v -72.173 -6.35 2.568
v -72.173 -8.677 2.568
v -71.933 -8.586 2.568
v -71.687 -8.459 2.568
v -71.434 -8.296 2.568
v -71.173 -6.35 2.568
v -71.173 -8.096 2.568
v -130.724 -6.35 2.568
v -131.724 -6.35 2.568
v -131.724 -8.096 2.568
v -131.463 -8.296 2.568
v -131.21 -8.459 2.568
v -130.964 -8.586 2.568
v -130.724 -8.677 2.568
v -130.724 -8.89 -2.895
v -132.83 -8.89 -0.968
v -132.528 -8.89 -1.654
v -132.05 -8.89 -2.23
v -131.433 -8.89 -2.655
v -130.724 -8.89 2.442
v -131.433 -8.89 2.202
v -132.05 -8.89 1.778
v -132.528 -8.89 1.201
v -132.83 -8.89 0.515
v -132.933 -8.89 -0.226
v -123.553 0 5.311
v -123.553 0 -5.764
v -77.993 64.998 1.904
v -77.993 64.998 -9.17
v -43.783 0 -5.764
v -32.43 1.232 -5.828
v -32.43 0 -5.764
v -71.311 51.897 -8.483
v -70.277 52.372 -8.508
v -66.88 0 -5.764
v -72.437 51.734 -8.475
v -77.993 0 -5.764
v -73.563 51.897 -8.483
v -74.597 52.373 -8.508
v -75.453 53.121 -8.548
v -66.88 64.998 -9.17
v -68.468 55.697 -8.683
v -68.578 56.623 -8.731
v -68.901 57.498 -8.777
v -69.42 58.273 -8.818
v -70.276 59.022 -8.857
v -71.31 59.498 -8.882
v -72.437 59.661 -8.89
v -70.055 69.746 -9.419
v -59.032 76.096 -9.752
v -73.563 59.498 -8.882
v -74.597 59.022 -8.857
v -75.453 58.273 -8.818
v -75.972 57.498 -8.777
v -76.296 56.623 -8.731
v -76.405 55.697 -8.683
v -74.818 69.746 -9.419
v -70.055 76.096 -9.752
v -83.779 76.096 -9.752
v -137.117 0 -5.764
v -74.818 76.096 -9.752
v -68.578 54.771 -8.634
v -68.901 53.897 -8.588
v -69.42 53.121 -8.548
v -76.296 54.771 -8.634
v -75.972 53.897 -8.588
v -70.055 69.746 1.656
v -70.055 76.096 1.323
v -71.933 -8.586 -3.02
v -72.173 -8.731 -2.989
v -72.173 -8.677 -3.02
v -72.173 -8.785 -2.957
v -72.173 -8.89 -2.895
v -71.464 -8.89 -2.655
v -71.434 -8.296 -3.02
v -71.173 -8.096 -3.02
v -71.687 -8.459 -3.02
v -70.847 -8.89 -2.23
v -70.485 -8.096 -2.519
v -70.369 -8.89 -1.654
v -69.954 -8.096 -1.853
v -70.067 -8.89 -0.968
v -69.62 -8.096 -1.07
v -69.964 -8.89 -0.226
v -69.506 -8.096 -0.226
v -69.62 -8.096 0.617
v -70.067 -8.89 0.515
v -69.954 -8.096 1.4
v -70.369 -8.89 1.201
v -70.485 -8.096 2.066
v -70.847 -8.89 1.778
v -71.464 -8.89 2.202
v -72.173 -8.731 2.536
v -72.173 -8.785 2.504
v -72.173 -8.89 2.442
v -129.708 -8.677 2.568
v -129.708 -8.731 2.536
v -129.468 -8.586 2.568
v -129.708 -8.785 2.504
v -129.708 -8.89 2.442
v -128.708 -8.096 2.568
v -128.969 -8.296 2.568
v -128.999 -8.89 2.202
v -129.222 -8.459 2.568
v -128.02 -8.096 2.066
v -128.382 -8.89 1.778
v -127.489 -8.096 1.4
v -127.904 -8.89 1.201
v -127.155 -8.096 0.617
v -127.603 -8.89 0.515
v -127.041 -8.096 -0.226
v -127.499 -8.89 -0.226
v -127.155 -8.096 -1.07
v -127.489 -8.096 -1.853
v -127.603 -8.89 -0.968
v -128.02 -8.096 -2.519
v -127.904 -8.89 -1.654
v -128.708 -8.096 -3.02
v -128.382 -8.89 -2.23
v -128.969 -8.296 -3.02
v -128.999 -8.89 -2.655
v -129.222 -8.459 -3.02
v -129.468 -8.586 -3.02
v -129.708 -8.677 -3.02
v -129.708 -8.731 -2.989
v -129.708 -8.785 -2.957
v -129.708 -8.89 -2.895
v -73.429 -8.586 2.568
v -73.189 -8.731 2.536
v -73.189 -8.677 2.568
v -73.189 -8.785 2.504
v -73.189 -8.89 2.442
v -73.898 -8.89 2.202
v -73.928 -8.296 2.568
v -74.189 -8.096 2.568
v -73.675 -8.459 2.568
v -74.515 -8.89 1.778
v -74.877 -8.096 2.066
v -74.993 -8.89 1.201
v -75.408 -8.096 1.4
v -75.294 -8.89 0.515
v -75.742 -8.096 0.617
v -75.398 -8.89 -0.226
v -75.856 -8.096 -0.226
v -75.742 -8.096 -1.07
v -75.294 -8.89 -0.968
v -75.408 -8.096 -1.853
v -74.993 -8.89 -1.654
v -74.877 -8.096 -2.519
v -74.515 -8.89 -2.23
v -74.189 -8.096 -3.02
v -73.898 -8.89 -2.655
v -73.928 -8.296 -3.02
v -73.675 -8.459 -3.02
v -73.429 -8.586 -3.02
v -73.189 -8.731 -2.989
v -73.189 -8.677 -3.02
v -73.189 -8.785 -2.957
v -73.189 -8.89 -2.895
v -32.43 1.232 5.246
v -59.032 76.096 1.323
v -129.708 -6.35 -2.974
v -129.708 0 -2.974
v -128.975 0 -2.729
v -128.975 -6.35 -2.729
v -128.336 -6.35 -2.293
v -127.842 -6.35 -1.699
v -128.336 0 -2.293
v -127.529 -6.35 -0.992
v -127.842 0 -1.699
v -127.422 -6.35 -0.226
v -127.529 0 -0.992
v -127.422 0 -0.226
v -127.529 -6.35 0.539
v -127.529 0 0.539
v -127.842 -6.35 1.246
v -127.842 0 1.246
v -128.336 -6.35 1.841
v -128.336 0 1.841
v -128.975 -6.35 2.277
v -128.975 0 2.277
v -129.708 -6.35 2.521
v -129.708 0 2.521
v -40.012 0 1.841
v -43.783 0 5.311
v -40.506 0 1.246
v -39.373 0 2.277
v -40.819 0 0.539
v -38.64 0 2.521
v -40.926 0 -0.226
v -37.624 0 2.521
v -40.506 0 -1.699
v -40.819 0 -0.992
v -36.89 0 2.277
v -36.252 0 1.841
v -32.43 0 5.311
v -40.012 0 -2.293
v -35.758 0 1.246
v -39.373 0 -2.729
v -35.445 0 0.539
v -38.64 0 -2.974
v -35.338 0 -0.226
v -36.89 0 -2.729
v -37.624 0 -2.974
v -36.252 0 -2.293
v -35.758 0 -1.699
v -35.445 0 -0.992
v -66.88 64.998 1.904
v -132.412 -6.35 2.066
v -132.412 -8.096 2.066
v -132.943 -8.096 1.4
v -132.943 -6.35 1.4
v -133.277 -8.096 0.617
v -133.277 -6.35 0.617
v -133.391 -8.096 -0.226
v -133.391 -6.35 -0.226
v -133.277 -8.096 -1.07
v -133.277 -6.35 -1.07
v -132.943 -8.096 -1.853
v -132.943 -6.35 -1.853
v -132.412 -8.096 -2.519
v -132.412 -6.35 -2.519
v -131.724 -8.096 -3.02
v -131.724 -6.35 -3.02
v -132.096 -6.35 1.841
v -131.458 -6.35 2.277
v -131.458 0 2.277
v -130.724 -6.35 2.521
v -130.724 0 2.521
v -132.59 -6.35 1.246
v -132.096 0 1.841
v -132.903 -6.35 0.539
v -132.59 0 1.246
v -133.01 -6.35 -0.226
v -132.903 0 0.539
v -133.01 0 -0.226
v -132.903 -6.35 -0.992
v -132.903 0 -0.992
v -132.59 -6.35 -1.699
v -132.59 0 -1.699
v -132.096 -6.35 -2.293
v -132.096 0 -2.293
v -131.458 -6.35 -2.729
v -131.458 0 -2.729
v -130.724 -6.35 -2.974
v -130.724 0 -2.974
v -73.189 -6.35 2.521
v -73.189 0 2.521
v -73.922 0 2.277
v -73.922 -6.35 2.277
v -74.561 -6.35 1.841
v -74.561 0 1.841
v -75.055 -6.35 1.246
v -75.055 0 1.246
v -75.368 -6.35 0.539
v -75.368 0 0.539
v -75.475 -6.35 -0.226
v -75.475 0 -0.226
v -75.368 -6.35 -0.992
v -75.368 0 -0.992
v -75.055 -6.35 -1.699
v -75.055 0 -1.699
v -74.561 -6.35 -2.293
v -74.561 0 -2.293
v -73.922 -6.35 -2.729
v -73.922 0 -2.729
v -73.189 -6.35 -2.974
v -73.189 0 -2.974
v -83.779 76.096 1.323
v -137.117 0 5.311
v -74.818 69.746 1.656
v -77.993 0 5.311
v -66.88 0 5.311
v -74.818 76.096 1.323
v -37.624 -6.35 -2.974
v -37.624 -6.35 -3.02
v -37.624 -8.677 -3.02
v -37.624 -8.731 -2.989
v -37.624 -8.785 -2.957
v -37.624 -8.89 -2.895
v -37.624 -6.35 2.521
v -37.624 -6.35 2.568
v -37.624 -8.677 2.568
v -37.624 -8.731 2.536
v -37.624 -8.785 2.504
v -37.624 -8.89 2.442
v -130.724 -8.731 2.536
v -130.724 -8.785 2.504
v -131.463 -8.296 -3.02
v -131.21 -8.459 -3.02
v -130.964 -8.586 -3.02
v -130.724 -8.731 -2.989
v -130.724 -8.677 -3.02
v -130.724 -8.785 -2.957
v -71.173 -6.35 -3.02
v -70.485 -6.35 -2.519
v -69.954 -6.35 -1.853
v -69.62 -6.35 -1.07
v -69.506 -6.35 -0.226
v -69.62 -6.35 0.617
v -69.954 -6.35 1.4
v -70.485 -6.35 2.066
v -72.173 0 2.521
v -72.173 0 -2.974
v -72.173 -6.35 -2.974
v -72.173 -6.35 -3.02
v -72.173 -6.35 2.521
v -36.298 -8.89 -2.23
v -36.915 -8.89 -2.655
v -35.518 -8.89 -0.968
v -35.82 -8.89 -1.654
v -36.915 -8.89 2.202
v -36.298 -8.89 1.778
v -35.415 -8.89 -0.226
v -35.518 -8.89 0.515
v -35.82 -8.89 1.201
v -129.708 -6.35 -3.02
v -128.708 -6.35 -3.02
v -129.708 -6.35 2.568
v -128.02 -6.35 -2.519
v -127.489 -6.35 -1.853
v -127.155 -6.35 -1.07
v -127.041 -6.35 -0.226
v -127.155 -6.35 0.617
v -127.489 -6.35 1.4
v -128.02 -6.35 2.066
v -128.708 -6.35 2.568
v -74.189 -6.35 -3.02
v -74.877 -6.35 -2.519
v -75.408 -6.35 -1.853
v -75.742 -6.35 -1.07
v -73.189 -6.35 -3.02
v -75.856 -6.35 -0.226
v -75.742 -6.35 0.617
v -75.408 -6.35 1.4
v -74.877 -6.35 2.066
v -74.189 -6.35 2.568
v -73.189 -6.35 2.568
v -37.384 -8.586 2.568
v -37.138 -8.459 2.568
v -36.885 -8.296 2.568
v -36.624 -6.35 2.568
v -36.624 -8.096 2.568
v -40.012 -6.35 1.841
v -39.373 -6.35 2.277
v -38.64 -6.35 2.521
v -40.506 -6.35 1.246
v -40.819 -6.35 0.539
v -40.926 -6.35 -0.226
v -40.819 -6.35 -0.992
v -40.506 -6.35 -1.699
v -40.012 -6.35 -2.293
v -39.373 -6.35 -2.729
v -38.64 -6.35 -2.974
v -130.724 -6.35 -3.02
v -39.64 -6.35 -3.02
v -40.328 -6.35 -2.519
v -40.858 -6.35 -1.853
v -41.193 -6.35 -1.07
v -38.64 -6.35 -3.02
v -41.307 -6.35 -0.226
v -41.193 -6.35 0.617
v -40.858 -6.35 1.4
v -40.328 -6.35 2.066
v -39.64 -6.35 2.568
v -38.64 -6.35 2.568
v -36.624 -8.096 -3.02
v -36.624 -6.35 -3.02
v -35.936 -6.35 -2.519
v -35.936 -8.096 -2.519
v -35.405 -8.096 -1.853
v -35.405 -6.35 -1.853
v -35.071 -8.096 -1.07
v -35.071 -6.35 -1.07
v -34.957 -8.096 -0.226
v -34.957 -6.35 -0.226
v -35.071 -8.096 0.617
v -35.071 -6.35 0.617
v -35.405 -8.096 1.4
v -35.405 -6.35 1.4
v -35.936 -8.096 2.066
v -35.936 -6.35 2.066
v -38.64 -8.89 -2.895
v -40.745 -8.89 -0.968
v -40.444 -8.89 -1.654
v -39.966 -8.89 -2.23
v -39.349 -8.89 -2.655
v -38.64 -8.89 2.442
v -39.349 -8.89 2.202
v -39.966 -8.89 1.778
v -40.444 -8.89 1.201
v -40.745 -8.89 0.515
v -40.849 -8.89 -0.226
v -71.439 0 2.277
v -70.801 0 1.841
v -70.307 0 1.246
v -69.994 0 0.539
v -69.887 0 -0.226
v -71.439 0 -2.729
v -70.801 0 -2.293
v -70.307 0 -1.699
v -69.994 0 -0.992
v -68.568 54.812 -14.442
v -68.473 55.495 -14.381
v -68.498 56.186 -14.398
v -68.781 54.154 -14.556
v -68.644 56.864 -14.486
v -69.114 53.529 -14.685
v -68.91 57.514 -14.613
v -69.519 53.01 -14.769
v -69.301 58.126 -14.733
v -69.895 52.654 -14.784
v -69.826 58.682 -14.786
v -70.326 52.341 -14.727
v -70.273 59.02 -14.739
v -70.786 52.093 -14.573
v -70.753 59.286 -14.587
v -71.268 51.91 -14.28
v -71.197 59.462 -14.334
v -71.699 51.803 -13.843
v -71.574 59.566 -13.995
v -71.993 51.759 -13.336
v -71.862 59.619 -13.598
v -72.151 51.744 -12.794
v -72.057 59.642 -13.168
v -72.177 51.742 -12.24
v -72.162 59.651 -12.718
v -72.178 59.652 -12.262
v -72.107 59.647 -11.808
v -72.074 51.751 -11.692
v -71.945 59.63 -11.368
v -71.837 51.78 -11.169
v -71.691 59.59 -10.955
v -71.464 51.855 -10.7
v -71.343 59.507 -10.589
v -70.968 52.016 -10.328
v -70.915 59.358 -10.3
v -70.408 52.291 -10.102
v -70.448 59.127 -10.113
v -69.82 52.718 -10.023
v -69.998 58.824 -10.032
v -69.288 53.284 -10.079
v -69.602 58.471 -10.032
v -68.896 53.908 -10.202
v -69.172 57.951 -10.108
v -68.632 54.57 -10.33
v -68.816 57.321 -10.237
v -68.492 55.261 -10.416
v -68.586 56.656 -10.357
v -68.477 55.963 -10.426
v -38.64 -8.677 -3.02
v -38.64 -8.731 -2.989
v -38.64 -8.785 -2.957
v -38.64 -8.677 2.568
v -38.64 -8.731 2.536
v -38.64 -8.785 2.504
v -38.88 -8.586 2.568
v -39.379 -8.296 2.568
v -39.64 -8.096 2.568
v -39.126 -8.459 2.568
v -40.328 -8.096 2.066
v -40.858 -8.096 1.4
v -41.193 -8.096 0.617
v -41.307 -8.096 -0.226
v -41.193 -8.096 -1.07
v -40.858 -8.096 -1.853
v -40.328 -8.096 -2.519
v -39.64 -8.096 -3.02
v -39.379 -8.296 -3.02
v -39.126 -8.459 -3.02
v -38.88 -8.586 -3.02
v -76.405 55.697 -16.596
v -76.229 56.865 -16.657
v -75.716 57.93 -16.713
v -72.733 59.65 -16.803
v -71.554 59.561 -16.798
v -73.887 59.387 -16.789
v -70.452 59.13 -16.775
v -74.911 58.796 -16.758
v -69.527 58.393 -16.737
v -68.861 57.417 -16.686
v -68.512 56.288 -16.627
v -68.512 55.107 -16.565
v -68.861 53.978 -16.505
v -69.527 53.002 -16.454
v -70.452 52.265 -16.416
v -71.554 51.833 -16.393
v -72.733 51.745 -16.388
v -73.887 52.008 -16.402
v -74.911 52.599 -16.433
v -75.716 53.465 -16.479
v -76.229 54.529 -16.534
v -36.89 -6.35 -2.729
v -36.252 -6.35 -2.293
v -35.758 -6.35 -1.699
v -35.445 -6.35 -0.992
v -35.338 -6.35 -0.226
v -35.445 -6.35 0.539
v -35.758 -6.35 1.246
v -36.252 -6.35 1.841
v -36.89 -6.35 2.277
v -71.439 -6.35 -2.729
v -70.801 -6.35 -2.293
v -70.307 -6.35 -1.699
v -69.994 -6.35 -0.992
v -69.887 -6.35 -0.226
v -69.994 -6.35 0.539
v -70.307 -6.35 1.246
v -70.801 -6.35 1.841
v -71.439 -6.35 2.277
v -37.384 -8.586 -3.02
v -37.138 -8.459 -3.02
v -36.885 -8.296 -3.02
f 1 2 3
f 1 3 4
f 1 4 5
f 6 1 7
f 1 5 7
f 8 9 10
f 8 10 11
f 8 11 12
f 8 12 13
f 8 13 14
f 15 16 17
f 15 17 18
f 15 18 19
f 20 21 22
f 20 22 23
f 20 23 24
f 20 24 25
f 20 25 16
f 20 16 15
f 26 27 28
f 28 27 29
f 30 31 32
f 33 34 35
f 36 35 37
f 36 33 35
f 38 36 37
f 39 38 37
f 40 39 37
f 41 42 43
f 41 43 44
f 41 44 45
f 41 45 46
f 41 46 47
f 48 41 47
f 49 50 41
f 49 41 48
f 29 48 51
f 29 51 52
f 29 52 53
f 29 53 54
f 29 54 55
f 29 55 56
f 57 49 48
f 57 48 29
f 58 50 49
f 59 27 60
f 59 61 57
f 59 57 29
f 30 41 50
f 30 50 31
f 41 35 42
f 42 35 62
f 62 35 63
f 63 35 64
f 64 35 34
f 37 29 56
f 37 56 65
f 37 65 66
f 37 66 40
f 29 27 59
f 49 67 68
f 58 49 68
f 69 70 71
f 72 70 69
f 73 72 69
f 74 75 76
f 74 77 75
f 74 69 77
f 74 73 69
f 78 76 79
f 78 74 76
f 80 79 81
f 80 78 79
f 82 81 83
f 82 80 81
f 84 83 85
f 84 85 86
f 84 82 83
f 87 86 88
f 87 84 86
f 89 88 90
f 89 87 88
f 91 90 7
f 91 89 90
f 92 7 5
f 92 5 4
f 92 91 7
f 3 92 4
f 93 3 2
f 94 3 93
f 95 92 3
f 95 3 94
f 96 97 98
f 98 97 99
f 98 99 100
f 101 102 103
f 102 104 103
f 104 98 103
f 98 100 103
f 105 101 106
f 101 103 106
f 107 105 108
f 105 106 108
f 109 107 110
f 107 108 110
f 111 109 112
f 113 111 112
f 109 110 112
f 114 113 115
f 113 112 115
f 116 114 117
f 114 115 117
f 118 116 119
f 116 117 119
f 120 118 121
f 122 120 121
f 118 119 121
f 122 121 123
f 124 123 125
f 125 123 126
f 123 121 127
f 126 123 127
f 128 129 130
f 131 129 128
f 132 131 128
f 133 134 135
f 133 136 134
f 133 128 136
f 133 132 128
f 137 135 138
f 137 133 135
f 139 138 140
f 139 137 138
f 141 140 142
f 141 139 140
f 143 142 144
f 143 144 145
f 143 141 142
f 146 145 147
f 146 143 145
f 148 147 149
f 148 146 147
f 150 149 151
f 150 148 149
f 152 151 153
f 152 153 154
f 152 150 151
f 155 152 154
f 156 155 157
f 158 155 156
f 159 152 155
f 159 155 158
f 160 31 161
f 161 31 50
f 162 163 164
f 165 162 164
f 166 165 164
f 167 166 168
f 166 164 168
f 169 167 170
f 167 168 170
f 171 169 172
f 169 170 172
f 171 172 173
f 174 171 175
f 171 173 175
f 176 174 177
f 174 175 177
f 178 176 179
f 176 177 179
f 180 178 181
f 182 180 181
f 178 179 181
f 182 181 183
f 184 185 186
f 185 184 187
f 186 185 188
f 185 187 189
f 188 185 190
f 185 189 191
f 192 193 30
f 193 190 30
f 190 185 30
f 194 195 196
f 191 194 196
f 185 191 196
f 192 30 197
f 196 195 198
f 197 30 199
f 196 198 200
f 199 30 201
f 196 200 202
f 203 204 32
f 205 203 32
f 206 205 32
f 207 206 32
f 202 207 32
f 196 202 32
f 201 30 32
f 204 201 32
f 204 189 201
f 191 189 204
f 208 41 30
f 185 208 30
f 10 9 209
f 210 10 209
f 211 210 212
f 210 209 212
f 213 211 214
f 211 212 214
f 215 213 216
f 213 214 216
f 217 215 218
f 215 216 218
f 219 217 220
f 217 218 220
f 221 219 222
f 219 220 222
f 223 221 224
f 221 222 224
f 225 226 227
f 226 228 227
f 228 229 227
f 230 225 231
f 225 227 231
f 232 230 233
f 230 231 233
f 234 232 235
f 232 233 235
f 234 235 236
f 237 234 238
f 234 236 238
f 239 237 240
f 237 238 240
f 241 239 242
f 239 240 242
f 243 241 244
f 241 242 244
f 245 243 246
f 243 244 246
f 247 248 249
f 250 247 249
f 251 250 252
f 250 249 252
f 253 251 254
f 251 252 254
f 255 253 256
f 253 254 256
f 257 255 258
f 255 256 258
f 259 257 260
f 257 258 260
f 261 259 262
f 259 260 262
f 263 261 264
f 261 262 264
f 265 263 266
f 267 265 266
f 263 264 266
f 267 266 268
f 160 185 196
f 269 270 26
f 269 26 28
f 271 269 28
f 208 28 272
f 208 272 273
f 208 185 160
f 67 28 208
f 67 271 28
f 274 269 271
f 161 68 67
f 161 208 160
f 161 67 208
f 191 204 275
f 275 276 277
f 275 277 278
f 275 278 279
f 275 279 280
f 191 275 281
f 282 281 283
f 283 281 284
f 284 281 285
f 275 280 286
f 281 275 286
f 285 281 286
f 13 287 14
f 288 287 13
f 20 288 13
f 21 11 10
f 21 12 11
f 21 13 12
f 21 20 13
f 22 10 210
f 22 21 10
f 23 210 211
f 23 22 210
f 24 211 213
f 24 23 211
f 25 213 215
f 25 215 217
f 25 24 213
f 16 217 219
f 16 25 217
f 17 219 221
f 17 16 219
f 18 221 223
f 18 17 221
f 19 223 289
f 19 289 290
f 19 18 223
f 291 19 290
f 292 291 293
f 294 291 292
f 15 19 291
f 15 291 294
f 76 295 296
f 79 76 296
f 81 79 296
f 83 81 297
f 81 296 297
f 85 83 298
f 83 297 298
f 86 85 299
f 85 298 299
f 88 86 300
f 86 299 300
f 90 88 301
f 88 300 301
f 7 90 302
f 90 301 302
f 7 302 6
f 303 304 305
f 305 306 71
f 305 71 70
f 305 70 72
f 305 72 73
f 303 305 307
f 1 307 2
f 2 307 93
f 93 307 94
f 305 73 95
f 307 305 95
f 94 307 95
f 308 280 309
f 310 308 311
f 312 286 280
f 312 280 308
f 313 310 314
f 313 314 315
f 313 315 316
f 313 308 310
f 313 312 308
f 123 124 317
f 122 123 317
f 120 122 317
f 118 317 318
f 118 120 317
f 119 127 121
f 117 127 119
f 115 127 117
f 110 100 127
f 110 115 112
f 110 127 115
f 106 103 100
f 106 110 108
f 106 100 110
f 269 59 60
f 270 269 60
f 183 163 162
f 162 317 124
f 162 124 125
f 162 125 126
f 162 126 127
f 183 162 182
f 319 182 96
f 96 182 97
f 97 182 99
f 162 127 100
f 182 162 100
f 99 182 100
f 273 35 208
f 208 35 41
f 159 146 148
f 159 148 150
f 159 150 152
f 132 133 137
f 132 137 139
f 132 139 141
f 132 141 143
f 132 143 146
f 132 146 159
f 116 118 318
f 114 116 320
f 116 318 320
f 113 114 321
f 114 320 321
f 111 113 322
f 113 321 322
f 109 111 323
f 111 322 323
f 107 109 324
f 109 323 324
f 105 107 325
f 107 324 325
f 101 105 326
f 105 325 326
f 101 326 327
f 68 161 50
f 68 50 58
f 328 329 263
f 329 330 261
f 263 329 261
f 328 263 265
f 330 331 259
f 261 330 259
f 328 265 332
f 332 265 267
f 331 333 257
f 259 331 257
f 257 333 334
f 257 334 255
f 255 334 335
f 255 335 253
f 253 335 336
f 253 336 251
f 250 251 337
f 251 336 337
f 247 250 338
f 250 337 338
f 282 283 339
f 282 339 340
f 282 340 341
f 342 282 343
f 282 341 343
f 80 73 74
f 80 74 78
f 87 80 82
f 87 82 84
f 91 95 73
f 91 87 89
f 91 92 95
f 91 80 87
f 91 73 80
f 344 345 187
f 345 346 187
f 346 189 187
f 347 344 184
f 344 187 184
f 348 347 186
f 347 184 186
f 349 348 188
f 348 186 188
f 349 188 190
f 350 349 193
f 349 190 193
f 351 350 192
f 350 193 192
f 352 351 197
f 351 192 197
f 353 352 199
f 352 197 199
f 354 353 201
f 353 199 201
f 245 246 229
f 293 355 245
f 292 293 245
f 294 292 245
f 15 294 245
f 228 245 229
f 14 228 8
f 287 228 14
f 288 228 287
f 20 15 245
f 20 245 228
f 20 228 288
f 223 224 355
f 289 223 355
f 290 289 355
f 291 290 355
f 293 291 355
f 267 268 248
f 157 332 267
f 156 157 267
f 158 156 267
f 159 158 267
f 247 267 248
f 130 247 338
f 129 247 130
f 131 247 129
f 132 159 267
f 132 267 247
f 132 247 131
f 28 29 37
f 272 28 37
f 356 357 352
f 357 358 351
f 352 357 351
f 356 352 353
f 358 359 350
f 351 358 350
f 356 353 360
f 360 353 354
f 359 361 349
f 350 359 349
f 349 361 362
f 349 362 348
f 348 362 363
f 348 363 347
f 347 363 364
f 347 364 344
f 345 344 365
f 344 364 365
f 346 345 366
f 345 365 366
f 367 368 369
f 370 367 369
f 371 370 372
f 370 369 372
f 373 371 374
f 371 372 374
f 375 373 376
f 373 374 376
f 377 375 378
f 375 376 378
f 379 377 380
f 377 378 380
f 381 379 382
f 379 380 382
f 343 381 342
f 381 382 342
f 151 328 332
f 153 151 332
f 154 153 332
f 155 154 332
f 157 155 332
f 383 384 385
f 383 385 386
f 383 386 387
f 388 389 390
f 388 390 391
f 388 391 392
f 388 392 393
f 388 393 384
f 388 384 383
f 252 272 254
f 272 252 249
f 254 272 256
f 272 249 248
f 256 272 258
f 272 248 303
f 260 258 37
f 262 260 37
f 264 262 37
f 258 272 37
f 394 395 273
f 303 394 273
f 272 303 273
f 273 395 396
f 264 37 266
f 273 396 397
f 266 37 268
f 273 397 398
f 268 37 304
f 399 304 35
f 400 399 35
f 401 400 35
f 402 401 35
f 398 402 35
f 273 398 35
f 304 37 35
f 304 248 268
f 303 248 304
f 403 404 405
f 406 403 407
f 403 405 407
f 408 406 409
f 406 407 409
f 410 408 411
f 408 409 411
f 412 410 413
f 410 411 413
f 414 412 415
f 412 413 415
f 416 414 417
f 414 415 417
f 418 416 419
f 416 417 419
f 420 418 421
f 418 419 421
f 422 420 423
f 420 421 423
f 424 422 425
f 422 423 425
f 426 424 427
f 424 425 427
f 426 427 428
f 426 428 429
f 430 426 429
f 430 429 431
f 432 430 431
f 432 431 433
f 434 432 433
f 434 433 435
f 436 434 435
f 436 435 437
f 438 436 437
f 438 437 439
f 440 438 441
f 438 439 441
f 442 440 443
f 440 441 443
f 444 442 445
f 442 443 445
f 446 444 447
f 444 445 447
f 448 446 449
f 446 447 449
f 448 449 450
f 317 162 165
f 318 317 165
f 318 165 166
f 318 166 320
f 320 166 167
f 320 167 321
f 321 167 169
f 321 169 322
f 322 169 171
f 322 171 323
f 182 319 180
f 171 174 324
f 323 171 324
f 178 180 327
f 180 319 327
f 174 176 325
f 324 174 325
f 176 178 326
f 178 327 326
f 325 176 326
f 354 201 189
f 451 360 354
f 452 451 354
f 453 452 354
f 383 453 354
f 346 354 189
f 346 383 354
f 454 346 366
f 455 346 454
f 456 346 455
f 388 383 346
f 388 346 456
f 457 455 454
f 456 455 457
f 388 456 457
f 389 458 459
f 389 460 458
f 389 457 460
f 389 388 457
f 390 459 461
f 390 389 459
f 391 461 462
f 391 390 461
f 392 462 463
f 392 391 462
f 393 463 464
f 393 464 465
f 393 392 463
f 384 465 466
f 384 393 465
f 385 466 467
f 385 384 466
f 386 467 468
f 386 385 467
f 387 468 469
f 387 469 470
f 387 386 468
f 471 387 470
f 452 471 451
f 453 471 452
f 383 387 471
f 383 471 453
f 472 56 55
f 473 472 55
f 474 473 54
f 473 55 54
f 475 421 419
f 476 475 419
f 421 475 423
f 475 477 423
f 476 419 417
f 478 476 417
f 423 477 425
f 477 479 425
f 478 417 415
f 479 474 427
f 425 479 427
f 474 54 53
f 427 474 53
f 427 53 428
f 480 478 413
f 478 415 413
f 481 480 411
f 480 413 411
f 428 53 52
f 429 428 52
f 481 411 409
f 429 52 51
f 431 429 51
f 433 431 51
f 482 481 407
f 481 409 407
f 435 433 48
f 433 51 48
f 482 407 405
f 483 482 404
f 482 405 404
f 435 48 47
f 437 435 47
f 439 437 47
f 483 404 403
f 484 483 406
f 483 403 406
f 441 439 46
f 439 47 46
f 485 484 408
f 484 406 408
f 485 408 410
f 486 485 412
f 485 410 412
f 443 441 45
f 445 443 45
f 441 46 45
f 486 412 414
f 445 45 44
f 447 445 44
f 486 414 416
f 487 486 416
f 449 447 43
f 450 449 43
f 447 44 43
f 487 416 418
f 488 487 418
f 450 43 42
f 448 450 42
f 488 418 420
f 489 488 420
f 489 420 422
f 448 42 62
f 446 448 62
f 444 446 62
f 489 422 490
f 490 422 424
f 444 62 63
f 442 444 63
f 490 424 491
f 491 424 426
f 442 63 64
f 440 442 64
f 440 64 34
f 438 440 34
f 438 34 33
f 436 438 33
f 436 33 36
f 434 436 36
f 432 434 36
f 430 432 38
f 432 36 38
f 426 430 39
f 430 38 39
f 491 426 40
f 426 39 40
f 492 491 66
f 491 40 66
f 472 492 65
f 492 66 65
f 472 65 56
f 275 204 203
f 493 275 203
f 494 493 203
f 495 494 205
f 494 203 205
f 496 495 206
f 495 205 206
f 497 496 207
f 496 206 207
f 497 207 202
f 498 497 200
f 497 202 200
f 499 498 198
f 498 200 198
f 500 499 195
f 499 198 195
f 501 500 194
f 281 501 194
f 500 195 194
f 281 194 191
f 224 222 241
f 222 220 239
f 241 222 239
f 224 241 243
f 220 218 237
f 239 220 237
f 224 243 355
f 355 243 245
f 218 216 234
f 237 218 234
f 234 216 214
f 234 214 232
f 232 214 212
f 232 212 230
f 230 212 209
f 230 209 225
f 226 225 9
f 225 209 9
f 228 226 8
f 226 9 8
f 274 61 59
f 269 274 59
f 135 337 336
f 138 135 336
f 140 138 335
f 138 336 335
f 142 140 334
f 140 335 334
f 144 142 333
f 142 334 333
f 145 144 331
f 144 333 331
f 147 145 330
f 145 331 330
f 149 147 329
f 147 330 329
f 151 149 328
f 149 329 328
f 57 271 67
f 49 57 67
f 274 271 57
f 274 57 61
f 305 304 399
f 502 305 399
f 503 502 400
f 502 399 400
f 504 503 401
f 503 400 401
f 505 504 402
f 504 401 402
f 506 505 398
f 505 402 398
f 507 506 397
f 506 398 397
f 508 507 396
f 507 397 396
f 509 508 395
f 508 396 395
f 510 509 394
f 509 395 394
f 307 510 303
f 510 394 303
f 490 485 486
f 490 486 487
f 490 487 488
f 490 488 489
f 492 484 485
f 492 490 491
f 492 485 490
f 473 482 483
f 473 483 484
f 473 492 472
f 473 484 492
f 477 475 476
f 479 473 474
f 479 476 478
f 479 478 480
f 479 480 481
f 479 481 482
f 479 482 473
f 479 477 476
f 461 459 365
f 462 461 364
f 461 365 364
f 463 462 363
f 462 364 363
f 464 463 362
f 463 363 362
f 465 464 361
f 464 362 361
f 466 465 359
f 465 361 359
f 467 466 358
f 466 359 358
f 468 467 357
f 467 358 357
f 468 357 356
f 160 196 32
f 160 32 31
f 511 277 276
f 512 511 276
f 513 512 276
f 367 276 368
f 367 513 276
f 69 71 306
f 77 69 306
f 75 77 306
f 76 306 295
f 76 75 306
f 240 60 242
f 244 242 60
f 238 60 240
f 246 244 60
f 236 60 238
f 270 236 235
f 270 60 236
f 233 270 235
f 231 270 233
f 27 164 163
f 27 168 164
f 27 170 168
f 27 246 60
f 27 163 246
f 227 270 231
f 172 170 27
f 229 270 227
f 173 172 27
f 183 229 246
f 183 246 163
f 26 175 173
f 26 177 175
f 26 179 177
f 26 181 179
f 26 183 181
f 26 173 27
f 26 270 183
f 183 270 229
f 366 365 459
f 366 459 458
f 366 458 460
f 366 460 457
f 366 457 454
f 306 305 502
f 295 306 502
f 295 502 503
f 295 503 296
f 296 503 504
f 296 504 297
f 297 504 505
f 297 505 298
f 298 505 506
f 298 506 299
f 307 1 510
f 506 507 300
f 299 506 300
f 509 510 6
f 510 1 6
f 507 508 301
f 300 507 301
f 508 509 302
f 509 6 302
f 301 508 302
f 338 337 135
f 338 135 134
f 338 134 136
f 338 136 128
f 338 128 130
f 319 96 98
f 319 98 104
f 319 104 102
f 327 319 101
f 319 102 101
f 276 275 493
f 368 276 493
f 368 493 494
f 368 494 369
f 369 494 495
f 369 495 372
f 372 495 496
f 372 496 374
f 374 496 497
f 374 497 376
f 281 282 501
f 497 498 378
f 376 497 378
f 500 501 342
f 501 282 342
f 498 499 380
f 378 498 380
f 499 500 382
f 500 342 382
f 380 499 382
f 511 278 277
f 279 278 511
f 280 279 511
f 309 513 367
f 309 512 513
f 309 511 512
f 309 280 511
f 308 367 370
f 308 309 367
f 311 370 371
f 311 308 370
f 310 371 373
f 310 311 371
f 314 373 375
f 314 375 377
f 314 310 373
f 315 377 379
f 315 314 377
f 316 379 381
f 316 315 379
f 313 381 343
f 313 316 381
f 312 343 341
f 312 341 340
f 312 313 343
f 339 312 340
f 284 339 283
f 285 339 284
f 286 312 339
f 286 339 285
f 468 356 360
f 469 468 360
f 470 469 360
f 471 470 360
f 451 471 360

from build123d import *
from OCP.BRepFilletAPI import BRepFilletAPI_MakeChamfer

# Parameters (mm, degrees)
BOSS_EXTRUDE2_DEPTH     = 11.0744
CUT_EXTRUDE1_DEPTH      = 158.120213562
CUT_EXTRUDE1_DEPTH_BACK = 158.120213562
SKETCH3_W               = 4.7625
SKETCH3_H               = 6.35
CUT_EXTRUDE6_DEPTH      = 158.120213562
CUT_EXTRUDE6_DEPTH_BACK = 158.120213562
SKETCH12_W              = 1.27
SKETCH12_H              = 1.27
SKETCH12_W_2            = 12.7
SKETCH12_H_2            = 12.7
SKETCH13_R              = 2.794
BOSS_EXTRUDE3_DEPTH     = 6.35
SKETCH14_R              = 3.175
BOSS_EXTRUDE4_DEPTH     = 2.54
CUT_EXTRUDE7_REACH      = 163.613
SKETCH15_W              = 1.016
SKETCH15_H              = 6.35
SKETCH15_W_2            = 3.01608289
SKETCH15_H_2            = 0.381
SKETCH17_R              = 3.96875
BOSS_EXTRUDE5_DEPTH     = 16.44396
SKETCH18_R              = 2.38125
CUT_EXTRUDE9_DEPTH      = 5.334
CHAMFER1_SIZE           = 0.79375
CHAMFER1_SIZE2          = 0.458271776
SKETCH19_W              = 6.0325
SKETCH19_H              = 64.754314085
BOSS_EXTRUDE11_DEPTH    = 8.542621607


with BuildPart() as part:
    # Sketch2 → Boss-Extrude2 (new, along a direction that is not the sketch's normal)
    with BuildSketch(Plane(origin=(0, -0.301230094, -5.747812595), x_dir=(1, 0, 0), z_dir=(0, 0.05233595624294042, 0.998629534754574))):
        Polygon((-31.991936044, 0.301643486), (-59.03245329, 76.501643486), (-83.778875482, 76.501643486), (-137.117219796, 0.301643486), (-123.552823331, 0.301643486), (-77.992987563, 65.389143486), (-77.992987563, 0.301643486), (-66.880487563, 0.301643486), (-66.880487563, 65.389143486), (-43.783379083, 0.301643486), align=None)
    extrude(amount=BOSS_EXTRUDE2_DEPTH, dir=(0, 0, 1))

    # Sketch3 → Cut-Extrude1 (cut, two sides: drawn at the far end of the back side and taken through both)
    with BuildSketch(Plane.XY.offset(-CUT_EXTRUDE1_DEPTH_BACK)):
        with Locations((-72.436737563, 72.920570548)):
            Rectangle(SKETCH3_W, SKETCH3_H)
    extrude(amount=CUT_EXTRUDE1_DEPTH + CUT_EXTRUDE1_DEPTH_BACK, mode=Mode.SUBTRACT)

    # Sketch12 → Cut-Extrude6 (cut, two sides: drawn at the far end of the back side and taken through both)
    with BuildSketch(Plane.XY.offset(-CUT_EXTRUDE6_DEPTH_BACK)):
        with Locations((-31.794579083, 0.635)):
            Rectangle(SKETCH12_W, SKETCH12_H)
        with Locations((-144.340183331, 6.35)):
            Rectangle(SKETCH12_W_2, SKETCH12_H_2)
    extrude(amount=CUT_EXTRUDE6_DEPTH + CUT_EXTRUDE6_DEPTH_BACK, mode=Mode.SUBTRACT)

    # Shell13: read off the stored shape, not the designer's step
    # Shell13: loft between two sections, ruled curve by curve
    shell13_from = [
        Edge.make_line((-67.225707879, 73.555570548, -9.618483502), (-41.990365712, 2.54, -5.896715155)),
        Edge.make_line((-35.590124494, 2.54, -5.896715155), (-60.82546666, 73.555570548, -9.618483502)),
        Edge.make_line((-41.990365712, 2.54, -5.896715155), (-35.590124494, 2.54, -5.896715155)),
        Edge.make_line((-60.82546666, 73.555570548, -9.618483502), (-67.225707879, 73.555570548, -9.618483502)),
    ]
    shell13_to = [
        Edge.make_line((-67.225707879, 73.555570548, -1.087569261), (-41.990365712, 2.54, 2.634199086)),
        Edge.make_line((-35.590124494, 2.54, 2.634199086), (-60.82546666, 73.555570548, -1.087569261)),
        Edge.make_line((-41.990365712, 2.54, 2.634199086), (-35.590124494, 2.54, 2.634199086)),
        Edge.make_line((-60.82546666, 73.555570548, -1.087569261), (-67.225707879, 73.555570548, -1.087569261)),
    ]
    shell13 = Solid(Shell([*[Face.make_surface_from_curves(shell13_from[k], shell13_to[k]) for k in range(4)], Face(Wire(shell13_from)), Face(Wire(shell13_to))]))
    add(shell13, mode=Mode.SUBTRACT)

    # Shell13 2: loft between two sections, ruled curve by curve
    shell13_2_from = [
        Edge.make_line((-75.452987563, 2.54, -5.896715155), (-69.420487563, 2.54, -5.896715155)),
        Edge.make_line((-75.452987563, 67.205570548, -9.285694103), (-69.420487563, 67.205570548, -9.285694103)),
        Edge.make_line((-69.420487563, 2.54, -5.896715155), (-69.420487563, 67.205570548, -9.285694103)),
        Edge.make_line((-75.452987563, 67.205570548, -9.285694103), (-75.452987563, 2.54, -5.896715155)),
    ]
    shell13_2_to = [
        Edge.make_line((-75.452987563, 2.54, 2.634199086), (-69.420487563, 2.54, 2.634199086)),
        Edge.make_line((-75.452987563, 67.205570548, -0.754779862), (-69.420487563, 67.205570548, -0.754779862)),
        Edge.make_line((-69.420487563, 2.54, 2.634199086), (-69.420487563, 67.205570548, -0.754779862)),
        Edge.make_line((-75.452987563, 67.205570548, -0.754779862), (-75.452987563, 2.54, 2.634199086)),
    ]
    shell13_2 = Solid(Shell([*[Face.make_surface_from_curves(shell13_2_from[k], shell13_2_to[k]) for k in range(4)], Face(Wire(shell13_2_from)), Face(Wire(shell13_2_to))]))
    add(shell13_2, mode=Mode.SUBTRACT)

    # Shell13 3: loft between two sections, ruled curve by curve
    shell13_3_from = [
        Edge.make_line((-132.235001715, 2.54, -5.896715155), (-124.87427188, 2.54, -5.896715155)),
        Edge.make_line((-82.457426933, 73.555570548, -9.618483502), (-77.357987563, 73.555570548, -9.618483502)),
        Edge.make_line((-82.457426933, 73.555570548, -9.618483502), (-132.235001715, 2.54, -5.896715155)),
        Edge.make_line((-124.87427188, 2.54, -5.896715155), (-77.357987563, 70.329482632, -9.449411398)),
        Edge.make_line((-77.357987563, 70.329482632, -9.449411398), (-77.357987563, 73.555570548, -9.618483502)),
    ]
    shell13_3_to = [
        Edge.make_line((-132.235001715, 2.54, 2.634199086), (-124.87427188, 2.54, 2.634199086)),
        Edge.make_line((-82.457426933, 73.555570548, -1.087569261), (-77.357987563, 73.555570548, -1.087569261)),
        Edge.make_line((-82.457426933, 73.555570548, -1.087569261), (-132.235001715, 2.54, 2.634199086)),
        Edge.make_line((-124.87427188, 2.54, 2.634199086), (-77.357987563, 70.329482632, -0.918497157)),
        Edge.make_line((-77.357987563, 70.329482632, -0.918497157), (-77.357987563, 73.555570548, -1.087569261)),
    ]
    shell13_3 = Solid(Shell([*[Face.make_surface_from_curves(shell13_3_from[k], shell13_3_to[k]) for k in range(5)], Face(Wire(shell13_3_from)), Face(Wire(shell13_3_to))]))
    add(shell13_3, mode=Mode.SUBTRACT)

    # Sketch13 → Boss-Extrude3 (add)
    with BuildSketch(Plane.XZ):
        with Locations(Location((-130.216039796, -0.226399396, 0), (0, 0, 180))):
            Circle(SKETCH13_R)
        with Locations(Location((-72.680959083, -0.226399396, 0), (0, 0, 90))):
            Circle(SKETCH13_R)
        with Locations(Location((-38.131879083, -0.226399396, 0), (0, 0, 180))):
            Circle(SKETCH13_R)
    extrude(amount=BOSS_EXTRUDE3_DEPTH)

    # Sketch14 → Boss-Extrude4 (add)
    with BuildSketch(Plane.XZ.offset(6.35)):
        with Locations((-130.216039796, -0.226399396)):
            Circle(SKETCH14_R)
        with Locations((-72.680959083, -0.226399396)):
            Circle(SKETCH14_R)
        with Locations((-38.131879083, -0.226399396)):
            Circle(SKETCH14_R)
    extrude(amount=BOSS_EXTRUDE4_DEPTH)

    # Cut-Extrude7: up to this face of the body (flat: up to its plane)
    cut_extrude7_end = Plane(part.part.faces().sort_by_distance((-136.942109777, 0, -0.226399396))[0])
    # Sketch15 → Cut-Extrude7 (cut, up to the picked face)
    with BuildSketch(Plane.XZ.offset(8.89), mode=Mode.PRIVATE) as cut_extrude7_sk1:
        with Locations((-130.216039796, -0.226399396)):
            Rectangle(SKETCH15_W, SKETCH15_H)
    cut_extrude7_tool1 = split(extrude(cut_extrude7_sk1.sketch, amount=-CUT_EXTRUDE7_REACH, mode=Mode.PRIVATE), bisect_by=cut_extrude7_end, keep=Keep.BOTH, mode=Mode.PRIVATE)
    # Sketch15 → Cut-Extrude7 (cut, up to the picked face)
    with BuildSketch(Plane.XZ.offset(8.89), mode=Mode.PRIVATE) as cut_extrude7_sk2:
        with Locations((-72.680959083, -0.226399396)):
            Rectangle(SKETCH15_W, SKETCH15_H)
    cut_extrude7_tool2 = split(extrude(cut_extrude7_sk2.sketch, amount=-CUT_EXTRUDE7_REACH, mode=Mode.PRIVATE), bisect_by=cut_extrude7_end, keep=Keep.BOTH, mode=Mode.PRIVATE)
    # Sketch15 → Cut-Extrude7 (cut, up to the picked face)
    with BuildSketch(Plane.XZ.offset(8.89), mode=Mode.PRIVATE) as cut_extrude7_sk3:
        with Locations((-38.131879083, -0.226399396)):
            Rectangle(SKETCH15_W, SKETCH15_H)
    cut_extrude7_tool3 = split(extrude(cut_extrude7_sk3.sketch, amount=-CUT_EXTRUDE7_REACH, mode=Mode.PRIVATE), bisect_by=cut_extrude7_end, keep=Keep.BOTH, mode=Mode.PRIVATE)
    # Sketch15 → Cut-Extrude7 (cut, up to the picked face)
    with BuildSketch(Plane.XZ.offset(8.89), mode=Mode.PRIVATE) as cut_extrude7_sk4:
        with Locations((-130.216039796, 2.758100604)):
            Rectangle(SKETCH15_W_2, SKETCH15_H_2)
    cut_extrude7_tool4 = split(extrude(cut_extrude7_sk4.sketch, amount=-CUT_EXTRUDE7_REACH, mode=Mode.PRIVATE), bisect_by=cut_extrude7_end, keep=Keep.BOTH, mode=Mode.PRIVATE)
    # Sketch15 → Cut-Extrude7 (cut, up to the picked face)
    with BuildSketch(Plane.XZ.offset(8.89), mode=Mode.PRIVATE) as cut_extrude7_sk5:
        with Locations((-130.216039796, -3.210899396)):
            Rectangle(SKETCH15_W_2, SKETCH15_H_2)
    cut_extrude7_tool5 = split(extrude(cut_extrude7_sk5.sketch, amount=-CUT_EXTRUDE7_REACH, mode=Mode.PRIVATE), bisect_by=cut_extrude7_end, keep=Keep.BOTH, mode=Mode.PRIVATE)
    # Sketch15 → Cut-Extrude7 (cut, up to the picked face)
    with BuildSketch(Plane.XZ.offset(8.89), mode=Mode.PRIVATE) as cut_extrude7_sk6:
        with Locations((-72.680959083, 2.758100604)):
            Rectangle(SKETCH15_W_2, SKETCH15_H_2)
    cut_extrude7_tool6 = split(extrude(cut_extrude7_sk6.sketch, amount=-CUT_EXTRUDE7_REACH, mode=Mode.PRIVATE), bisect_by=cut_extrude7_end, keep=Keep.BOTH, mode=Mode.PRIVATE)
    # Sketch15 → Cut-Extrude7 (cut, up to the picked face)
    with BuildSketch(Plane.XZ.offset(8.89), mode=Mode.PRIVATE) as cut_extrude7_sk7:
        with Locations((-72.680959083, -3.210899396)):
            Rectangle(SKETCH15_W_2, SKETCH15_H_2)
    cut_extrude7_tool7 = split(extrude(cut_extrude7_sk7.sketch, amount=-CUT_EXTRUDE7_REACH, mode=Mode.PRIVATE), bisect_by=cut_extrude7_end, keep=Keep.BOTH, mode=Mode.PRIVATE)
    # Sketch15 → Cut-Extrude7 (cut, up to the picked face)
    with BuildSketch(Plane.XZ.offset(8.89), mode=Mode.PRIVATE) as cut_extrude7_sk8:
        with Locations((-38.131879083, -3.210899396)):
            Rectangle(SKETCH15_W_2, SKETCH15_H_2)
    cut_extrude7_tool8 = split(extrude(cut_extrude7_sk8.sketch, amount=-CUT_EXTRUDE7_REACH, mode=Mode.PRIVATE), bisect_by=cut_extrude7_end, keep=Keep.BOTH, mode=Mode.PRIVATE)
    # Sketch15 → Cut-Extrude7 (cut, up to the picked face)
    with BuildSketch(Plane.XZ.offset(8.89), mode=Mode.PRIVATE) as cut_extrude7_sk9:
        with Locations((-38.131879083, 2.758100604)):
            Rectangle(SKETCH15_W_2, SKETCH15_H_2)
    cut_extrude7_tool9 = split(extrude(cut_extrude7_sk9.sketch, amount=-CUT_EXTRUDE7_REACH, mode=Mode.PRIVATE), bisect_by=cut_extrude7_end, keep=Keep.BOTH, mode=Mode.PRIVATE)
    add(cut_extrude7_tool1.solids().sort_by(Axis((-130.21604, -8.89, -0.226399), (0, 1, 0)))[0], mode=Mode.SUBTRACT)
    add(cut_extrude7_tool2.solids().sort_by(Axis((-72.680959, -8.89, -0.226399), (0, 1, 0)))[0], mode=Mode.SUBTRACT)
    add(cut_extrude7_tool3.solids().sort_by(Axis((-38.131879, -8.89, -0.226399), (0, 1, 0)))[0], mode=Mode.SUBTRACT)
    add(cut_extrude7_tool4.solids().sort_by(Axis((-130.21604, -8.89, 2.758101), (0, 1, 0)))[0], mode=Mode.SUBTRACT)
    add(cut_extrude7_tool5.solids().sort_by(Axis((-130.21604, -8.89, -3.210899), (0, 1, 0)))[0], mode=Mode.SUBTRACT)
    add(cut_extrude7_tool6.solids().sort_by(Axis((-72.680959, -8.89, 2.758101), (0, 1, 0)))[0], mode=Mode.SUBTRACT)
    add(cut_extrude7_tool7.solids().sort_by(Axis((-72.680959, -8.89, -3.210899), (0, 1, 0)))[0], mode=Mode.SUBTRACT)
    add(cut_extrude7_tool8.solids().sort_by(Axis((-38.131879, -8.89, -3.210899), (0, 1, 0)))[0], mode=Mode.SUBTRACT)
    add(cut_extrude7_tool9.solids().sort_by(Axis((-38.131879, -8.89, 2.758101), (0, 1, 0)))[0], mode=Mode.SUBTRACT)

    # Sketch17 → Boss-Extrude5 (add, along a direction that is not the sketch's normal)
    with BuildSketch(Plane(origin=(0, 0.144631584, 2.759735025), x_dir=(-1, 0, 0), z_dir=(0, -0.052335956242940435, -0.998629534754574))):
        with Locations((72.436737563, 55.628895348)):
            Circle(SKETCH17_R)
    extrude(amount=BOSS_EXTRUDE5_DEPTH, dir=(0, 0, -1))

    # Sketch18 → Cut-Extrude9 (cut, symmetric)
    with BuildSketch(Plane(origin=(0, 56.273410548, 0), x_dir=(1, 0, 0), z_dir=(0, 1, 0))):
        with Locations((-69.801487563, 12.404616407)):
            Circle(SKETCH18_R)
    extrude(amount=CUT_EXTRUDE9_DEPTH, both=True, mode=Mode.SUBTRACT)

    # Chamfer1: one chamfer whose edges measure the first distance from different faces: ONE call of the kernel's chamfer builder (chamfer() names one face for all edges)
    chamfer1_edges_1 = [part.edges().sort_by_distance(p)[0] for p in [
        (-133.391039796, -8.89, -0.226399396),
    ]]
    chamfer1_side_1 = [part.faces().sort_by_distance(p)[0] for p in [
        (-133.391039796, -7.62, -0.226399396),
    ]]
    chamfer1_edges_2 = [part.edges().sort_by_distance(p)[0] for p in [
        (-127.041039796, -8.89, -0.226399396),
    ]]
    chamfer1_side_2 = [part.faces().sort_by_distance(p)[0] for p in [
        (-127.041039796, -7.62, -0.226399396),
    ]]
    chamfer1_edges_3 = [part.edges().sort_by_distance(p)[0] for p in [
        (-75.855959083, -8.89, -0.226399396),
    ]]
    chamfer1_side_3 = [part.faces().sort_by_distance(p)[0] for p in [
        (-75.855959083, -7.62, -0.226399396),
    ]]
    chamfer1_edges_4 = [part.edges().sort_by_distance(p)[0] for p in [
        (-69.505959083, -8.89, -0.226399396),
    ]]
    chamfer1_side_4 = [part.faces().sort_by_distance(p)[0] for p in [
        (-69.505959083, -7.62, -0.226399396),
    ]]
    chamfer1_edges_5 = [part.edges().sort_by_distance(p)[0] for p in [
        (-41.306879083, -8.89, -0.226399396),
    ]]
    chamfer1_side_5 = [part.faces().sort_by_distance(p)[0] for p in [
        (-41.306879083, -7.62, -0.226399396),
    ]]
    chamfer1_edges_6 = [part.edges().sort_by_distance(p)[0] for p in [
        (-34.956879083, -8.89, -0.226399396),
    ]]
    chamfer1_side_6 = [part.faces().sort_by_distance(p)[0] for p in [
        (-34.956879083, -7.62, -0.226399396),
    ]]
    chamfer1 = BRepFilletAPI_MakeChamfer(part.part.solid().wrapped)
    for e in chamfer1_edges_1:
        chamfer1.Add(CHAMFER1_SIZE, CHAMFER1_SIZE2, e.wrapped, chamfer1_side_1[0].wrapped)  # the first distance lies on this face
    for e in chamfer1_edges_2:
        chamfer1.Add(CHAMFER1_SIZE, CHAMFER1_SIZE2, e.wrapped, chamfer1_side_2[0].wrapped)  # the first distance lies on this face
    for e in chamfer1_edges_3:
        chamfer1.Add(CHAMFER1_SIZE, CHAMFER1_SIZE2, e.wrapped, chamfer1_side_3[0].wrapped)  # the first distance lies on this face
    for e in chamfer1_edges_4:
        chamfer1.Add(CHAMFER1_SIZE, CHAMFER1_SIZE2, e.wrapped, chamfer1_side_4[0].wrapped)  # the first distance lies on this face
    for e in chamfer1_edges_5:
        chamfer1.Add(CHAMFER1_SIZE, CHAMFER1_SIZE2, e.wrapped, chamfer1_side_5[0].wrapped)  # the first distance lies on this face
    for e in chamfer1_edges_6:
        chamfer1.Add(CHAMFER1_SIZE, CHAMFER1_SIZE2, e.wrapped, chamfer1_side_6[0].wrapped)  # the first distance lies on this face
    add(Compound.cast(chamfer1.Shape()), mode=Mode.REPLACE)

    # Sketch19 → Boss-Extrude11 (add, along a direction that is not the sketch's normal)
    with BuildSketch(Plane(origin=(0, -0.301230094, -5.747812595), x_dir=(-1, 0, 0), z_dir=(0, -0.052335956242940455, -0.9986295347545742))):
        with Locations((72.436737563, 35.222286287)):
            Rectangle(SKETCH19_W, SKETCH19_H)
        Polygon((77.357987563, 73.958157727), (77.357987563, 70.727642501), (124.87427188, 2.845129245), (132.235001715, 2.845129245), (82.457426933, 73.958157727), align=None)
        Polygon((67.225707879, 73.958157727), (41.990365712, 2.845129245), (35.590124494, 2.845129245), (60.82546666, 73.958157727), align=None)
    extrude(amount=-BOSS_EXTRUDE11_DEPTH, dir=(0, 0, -1))


solid = part.part
